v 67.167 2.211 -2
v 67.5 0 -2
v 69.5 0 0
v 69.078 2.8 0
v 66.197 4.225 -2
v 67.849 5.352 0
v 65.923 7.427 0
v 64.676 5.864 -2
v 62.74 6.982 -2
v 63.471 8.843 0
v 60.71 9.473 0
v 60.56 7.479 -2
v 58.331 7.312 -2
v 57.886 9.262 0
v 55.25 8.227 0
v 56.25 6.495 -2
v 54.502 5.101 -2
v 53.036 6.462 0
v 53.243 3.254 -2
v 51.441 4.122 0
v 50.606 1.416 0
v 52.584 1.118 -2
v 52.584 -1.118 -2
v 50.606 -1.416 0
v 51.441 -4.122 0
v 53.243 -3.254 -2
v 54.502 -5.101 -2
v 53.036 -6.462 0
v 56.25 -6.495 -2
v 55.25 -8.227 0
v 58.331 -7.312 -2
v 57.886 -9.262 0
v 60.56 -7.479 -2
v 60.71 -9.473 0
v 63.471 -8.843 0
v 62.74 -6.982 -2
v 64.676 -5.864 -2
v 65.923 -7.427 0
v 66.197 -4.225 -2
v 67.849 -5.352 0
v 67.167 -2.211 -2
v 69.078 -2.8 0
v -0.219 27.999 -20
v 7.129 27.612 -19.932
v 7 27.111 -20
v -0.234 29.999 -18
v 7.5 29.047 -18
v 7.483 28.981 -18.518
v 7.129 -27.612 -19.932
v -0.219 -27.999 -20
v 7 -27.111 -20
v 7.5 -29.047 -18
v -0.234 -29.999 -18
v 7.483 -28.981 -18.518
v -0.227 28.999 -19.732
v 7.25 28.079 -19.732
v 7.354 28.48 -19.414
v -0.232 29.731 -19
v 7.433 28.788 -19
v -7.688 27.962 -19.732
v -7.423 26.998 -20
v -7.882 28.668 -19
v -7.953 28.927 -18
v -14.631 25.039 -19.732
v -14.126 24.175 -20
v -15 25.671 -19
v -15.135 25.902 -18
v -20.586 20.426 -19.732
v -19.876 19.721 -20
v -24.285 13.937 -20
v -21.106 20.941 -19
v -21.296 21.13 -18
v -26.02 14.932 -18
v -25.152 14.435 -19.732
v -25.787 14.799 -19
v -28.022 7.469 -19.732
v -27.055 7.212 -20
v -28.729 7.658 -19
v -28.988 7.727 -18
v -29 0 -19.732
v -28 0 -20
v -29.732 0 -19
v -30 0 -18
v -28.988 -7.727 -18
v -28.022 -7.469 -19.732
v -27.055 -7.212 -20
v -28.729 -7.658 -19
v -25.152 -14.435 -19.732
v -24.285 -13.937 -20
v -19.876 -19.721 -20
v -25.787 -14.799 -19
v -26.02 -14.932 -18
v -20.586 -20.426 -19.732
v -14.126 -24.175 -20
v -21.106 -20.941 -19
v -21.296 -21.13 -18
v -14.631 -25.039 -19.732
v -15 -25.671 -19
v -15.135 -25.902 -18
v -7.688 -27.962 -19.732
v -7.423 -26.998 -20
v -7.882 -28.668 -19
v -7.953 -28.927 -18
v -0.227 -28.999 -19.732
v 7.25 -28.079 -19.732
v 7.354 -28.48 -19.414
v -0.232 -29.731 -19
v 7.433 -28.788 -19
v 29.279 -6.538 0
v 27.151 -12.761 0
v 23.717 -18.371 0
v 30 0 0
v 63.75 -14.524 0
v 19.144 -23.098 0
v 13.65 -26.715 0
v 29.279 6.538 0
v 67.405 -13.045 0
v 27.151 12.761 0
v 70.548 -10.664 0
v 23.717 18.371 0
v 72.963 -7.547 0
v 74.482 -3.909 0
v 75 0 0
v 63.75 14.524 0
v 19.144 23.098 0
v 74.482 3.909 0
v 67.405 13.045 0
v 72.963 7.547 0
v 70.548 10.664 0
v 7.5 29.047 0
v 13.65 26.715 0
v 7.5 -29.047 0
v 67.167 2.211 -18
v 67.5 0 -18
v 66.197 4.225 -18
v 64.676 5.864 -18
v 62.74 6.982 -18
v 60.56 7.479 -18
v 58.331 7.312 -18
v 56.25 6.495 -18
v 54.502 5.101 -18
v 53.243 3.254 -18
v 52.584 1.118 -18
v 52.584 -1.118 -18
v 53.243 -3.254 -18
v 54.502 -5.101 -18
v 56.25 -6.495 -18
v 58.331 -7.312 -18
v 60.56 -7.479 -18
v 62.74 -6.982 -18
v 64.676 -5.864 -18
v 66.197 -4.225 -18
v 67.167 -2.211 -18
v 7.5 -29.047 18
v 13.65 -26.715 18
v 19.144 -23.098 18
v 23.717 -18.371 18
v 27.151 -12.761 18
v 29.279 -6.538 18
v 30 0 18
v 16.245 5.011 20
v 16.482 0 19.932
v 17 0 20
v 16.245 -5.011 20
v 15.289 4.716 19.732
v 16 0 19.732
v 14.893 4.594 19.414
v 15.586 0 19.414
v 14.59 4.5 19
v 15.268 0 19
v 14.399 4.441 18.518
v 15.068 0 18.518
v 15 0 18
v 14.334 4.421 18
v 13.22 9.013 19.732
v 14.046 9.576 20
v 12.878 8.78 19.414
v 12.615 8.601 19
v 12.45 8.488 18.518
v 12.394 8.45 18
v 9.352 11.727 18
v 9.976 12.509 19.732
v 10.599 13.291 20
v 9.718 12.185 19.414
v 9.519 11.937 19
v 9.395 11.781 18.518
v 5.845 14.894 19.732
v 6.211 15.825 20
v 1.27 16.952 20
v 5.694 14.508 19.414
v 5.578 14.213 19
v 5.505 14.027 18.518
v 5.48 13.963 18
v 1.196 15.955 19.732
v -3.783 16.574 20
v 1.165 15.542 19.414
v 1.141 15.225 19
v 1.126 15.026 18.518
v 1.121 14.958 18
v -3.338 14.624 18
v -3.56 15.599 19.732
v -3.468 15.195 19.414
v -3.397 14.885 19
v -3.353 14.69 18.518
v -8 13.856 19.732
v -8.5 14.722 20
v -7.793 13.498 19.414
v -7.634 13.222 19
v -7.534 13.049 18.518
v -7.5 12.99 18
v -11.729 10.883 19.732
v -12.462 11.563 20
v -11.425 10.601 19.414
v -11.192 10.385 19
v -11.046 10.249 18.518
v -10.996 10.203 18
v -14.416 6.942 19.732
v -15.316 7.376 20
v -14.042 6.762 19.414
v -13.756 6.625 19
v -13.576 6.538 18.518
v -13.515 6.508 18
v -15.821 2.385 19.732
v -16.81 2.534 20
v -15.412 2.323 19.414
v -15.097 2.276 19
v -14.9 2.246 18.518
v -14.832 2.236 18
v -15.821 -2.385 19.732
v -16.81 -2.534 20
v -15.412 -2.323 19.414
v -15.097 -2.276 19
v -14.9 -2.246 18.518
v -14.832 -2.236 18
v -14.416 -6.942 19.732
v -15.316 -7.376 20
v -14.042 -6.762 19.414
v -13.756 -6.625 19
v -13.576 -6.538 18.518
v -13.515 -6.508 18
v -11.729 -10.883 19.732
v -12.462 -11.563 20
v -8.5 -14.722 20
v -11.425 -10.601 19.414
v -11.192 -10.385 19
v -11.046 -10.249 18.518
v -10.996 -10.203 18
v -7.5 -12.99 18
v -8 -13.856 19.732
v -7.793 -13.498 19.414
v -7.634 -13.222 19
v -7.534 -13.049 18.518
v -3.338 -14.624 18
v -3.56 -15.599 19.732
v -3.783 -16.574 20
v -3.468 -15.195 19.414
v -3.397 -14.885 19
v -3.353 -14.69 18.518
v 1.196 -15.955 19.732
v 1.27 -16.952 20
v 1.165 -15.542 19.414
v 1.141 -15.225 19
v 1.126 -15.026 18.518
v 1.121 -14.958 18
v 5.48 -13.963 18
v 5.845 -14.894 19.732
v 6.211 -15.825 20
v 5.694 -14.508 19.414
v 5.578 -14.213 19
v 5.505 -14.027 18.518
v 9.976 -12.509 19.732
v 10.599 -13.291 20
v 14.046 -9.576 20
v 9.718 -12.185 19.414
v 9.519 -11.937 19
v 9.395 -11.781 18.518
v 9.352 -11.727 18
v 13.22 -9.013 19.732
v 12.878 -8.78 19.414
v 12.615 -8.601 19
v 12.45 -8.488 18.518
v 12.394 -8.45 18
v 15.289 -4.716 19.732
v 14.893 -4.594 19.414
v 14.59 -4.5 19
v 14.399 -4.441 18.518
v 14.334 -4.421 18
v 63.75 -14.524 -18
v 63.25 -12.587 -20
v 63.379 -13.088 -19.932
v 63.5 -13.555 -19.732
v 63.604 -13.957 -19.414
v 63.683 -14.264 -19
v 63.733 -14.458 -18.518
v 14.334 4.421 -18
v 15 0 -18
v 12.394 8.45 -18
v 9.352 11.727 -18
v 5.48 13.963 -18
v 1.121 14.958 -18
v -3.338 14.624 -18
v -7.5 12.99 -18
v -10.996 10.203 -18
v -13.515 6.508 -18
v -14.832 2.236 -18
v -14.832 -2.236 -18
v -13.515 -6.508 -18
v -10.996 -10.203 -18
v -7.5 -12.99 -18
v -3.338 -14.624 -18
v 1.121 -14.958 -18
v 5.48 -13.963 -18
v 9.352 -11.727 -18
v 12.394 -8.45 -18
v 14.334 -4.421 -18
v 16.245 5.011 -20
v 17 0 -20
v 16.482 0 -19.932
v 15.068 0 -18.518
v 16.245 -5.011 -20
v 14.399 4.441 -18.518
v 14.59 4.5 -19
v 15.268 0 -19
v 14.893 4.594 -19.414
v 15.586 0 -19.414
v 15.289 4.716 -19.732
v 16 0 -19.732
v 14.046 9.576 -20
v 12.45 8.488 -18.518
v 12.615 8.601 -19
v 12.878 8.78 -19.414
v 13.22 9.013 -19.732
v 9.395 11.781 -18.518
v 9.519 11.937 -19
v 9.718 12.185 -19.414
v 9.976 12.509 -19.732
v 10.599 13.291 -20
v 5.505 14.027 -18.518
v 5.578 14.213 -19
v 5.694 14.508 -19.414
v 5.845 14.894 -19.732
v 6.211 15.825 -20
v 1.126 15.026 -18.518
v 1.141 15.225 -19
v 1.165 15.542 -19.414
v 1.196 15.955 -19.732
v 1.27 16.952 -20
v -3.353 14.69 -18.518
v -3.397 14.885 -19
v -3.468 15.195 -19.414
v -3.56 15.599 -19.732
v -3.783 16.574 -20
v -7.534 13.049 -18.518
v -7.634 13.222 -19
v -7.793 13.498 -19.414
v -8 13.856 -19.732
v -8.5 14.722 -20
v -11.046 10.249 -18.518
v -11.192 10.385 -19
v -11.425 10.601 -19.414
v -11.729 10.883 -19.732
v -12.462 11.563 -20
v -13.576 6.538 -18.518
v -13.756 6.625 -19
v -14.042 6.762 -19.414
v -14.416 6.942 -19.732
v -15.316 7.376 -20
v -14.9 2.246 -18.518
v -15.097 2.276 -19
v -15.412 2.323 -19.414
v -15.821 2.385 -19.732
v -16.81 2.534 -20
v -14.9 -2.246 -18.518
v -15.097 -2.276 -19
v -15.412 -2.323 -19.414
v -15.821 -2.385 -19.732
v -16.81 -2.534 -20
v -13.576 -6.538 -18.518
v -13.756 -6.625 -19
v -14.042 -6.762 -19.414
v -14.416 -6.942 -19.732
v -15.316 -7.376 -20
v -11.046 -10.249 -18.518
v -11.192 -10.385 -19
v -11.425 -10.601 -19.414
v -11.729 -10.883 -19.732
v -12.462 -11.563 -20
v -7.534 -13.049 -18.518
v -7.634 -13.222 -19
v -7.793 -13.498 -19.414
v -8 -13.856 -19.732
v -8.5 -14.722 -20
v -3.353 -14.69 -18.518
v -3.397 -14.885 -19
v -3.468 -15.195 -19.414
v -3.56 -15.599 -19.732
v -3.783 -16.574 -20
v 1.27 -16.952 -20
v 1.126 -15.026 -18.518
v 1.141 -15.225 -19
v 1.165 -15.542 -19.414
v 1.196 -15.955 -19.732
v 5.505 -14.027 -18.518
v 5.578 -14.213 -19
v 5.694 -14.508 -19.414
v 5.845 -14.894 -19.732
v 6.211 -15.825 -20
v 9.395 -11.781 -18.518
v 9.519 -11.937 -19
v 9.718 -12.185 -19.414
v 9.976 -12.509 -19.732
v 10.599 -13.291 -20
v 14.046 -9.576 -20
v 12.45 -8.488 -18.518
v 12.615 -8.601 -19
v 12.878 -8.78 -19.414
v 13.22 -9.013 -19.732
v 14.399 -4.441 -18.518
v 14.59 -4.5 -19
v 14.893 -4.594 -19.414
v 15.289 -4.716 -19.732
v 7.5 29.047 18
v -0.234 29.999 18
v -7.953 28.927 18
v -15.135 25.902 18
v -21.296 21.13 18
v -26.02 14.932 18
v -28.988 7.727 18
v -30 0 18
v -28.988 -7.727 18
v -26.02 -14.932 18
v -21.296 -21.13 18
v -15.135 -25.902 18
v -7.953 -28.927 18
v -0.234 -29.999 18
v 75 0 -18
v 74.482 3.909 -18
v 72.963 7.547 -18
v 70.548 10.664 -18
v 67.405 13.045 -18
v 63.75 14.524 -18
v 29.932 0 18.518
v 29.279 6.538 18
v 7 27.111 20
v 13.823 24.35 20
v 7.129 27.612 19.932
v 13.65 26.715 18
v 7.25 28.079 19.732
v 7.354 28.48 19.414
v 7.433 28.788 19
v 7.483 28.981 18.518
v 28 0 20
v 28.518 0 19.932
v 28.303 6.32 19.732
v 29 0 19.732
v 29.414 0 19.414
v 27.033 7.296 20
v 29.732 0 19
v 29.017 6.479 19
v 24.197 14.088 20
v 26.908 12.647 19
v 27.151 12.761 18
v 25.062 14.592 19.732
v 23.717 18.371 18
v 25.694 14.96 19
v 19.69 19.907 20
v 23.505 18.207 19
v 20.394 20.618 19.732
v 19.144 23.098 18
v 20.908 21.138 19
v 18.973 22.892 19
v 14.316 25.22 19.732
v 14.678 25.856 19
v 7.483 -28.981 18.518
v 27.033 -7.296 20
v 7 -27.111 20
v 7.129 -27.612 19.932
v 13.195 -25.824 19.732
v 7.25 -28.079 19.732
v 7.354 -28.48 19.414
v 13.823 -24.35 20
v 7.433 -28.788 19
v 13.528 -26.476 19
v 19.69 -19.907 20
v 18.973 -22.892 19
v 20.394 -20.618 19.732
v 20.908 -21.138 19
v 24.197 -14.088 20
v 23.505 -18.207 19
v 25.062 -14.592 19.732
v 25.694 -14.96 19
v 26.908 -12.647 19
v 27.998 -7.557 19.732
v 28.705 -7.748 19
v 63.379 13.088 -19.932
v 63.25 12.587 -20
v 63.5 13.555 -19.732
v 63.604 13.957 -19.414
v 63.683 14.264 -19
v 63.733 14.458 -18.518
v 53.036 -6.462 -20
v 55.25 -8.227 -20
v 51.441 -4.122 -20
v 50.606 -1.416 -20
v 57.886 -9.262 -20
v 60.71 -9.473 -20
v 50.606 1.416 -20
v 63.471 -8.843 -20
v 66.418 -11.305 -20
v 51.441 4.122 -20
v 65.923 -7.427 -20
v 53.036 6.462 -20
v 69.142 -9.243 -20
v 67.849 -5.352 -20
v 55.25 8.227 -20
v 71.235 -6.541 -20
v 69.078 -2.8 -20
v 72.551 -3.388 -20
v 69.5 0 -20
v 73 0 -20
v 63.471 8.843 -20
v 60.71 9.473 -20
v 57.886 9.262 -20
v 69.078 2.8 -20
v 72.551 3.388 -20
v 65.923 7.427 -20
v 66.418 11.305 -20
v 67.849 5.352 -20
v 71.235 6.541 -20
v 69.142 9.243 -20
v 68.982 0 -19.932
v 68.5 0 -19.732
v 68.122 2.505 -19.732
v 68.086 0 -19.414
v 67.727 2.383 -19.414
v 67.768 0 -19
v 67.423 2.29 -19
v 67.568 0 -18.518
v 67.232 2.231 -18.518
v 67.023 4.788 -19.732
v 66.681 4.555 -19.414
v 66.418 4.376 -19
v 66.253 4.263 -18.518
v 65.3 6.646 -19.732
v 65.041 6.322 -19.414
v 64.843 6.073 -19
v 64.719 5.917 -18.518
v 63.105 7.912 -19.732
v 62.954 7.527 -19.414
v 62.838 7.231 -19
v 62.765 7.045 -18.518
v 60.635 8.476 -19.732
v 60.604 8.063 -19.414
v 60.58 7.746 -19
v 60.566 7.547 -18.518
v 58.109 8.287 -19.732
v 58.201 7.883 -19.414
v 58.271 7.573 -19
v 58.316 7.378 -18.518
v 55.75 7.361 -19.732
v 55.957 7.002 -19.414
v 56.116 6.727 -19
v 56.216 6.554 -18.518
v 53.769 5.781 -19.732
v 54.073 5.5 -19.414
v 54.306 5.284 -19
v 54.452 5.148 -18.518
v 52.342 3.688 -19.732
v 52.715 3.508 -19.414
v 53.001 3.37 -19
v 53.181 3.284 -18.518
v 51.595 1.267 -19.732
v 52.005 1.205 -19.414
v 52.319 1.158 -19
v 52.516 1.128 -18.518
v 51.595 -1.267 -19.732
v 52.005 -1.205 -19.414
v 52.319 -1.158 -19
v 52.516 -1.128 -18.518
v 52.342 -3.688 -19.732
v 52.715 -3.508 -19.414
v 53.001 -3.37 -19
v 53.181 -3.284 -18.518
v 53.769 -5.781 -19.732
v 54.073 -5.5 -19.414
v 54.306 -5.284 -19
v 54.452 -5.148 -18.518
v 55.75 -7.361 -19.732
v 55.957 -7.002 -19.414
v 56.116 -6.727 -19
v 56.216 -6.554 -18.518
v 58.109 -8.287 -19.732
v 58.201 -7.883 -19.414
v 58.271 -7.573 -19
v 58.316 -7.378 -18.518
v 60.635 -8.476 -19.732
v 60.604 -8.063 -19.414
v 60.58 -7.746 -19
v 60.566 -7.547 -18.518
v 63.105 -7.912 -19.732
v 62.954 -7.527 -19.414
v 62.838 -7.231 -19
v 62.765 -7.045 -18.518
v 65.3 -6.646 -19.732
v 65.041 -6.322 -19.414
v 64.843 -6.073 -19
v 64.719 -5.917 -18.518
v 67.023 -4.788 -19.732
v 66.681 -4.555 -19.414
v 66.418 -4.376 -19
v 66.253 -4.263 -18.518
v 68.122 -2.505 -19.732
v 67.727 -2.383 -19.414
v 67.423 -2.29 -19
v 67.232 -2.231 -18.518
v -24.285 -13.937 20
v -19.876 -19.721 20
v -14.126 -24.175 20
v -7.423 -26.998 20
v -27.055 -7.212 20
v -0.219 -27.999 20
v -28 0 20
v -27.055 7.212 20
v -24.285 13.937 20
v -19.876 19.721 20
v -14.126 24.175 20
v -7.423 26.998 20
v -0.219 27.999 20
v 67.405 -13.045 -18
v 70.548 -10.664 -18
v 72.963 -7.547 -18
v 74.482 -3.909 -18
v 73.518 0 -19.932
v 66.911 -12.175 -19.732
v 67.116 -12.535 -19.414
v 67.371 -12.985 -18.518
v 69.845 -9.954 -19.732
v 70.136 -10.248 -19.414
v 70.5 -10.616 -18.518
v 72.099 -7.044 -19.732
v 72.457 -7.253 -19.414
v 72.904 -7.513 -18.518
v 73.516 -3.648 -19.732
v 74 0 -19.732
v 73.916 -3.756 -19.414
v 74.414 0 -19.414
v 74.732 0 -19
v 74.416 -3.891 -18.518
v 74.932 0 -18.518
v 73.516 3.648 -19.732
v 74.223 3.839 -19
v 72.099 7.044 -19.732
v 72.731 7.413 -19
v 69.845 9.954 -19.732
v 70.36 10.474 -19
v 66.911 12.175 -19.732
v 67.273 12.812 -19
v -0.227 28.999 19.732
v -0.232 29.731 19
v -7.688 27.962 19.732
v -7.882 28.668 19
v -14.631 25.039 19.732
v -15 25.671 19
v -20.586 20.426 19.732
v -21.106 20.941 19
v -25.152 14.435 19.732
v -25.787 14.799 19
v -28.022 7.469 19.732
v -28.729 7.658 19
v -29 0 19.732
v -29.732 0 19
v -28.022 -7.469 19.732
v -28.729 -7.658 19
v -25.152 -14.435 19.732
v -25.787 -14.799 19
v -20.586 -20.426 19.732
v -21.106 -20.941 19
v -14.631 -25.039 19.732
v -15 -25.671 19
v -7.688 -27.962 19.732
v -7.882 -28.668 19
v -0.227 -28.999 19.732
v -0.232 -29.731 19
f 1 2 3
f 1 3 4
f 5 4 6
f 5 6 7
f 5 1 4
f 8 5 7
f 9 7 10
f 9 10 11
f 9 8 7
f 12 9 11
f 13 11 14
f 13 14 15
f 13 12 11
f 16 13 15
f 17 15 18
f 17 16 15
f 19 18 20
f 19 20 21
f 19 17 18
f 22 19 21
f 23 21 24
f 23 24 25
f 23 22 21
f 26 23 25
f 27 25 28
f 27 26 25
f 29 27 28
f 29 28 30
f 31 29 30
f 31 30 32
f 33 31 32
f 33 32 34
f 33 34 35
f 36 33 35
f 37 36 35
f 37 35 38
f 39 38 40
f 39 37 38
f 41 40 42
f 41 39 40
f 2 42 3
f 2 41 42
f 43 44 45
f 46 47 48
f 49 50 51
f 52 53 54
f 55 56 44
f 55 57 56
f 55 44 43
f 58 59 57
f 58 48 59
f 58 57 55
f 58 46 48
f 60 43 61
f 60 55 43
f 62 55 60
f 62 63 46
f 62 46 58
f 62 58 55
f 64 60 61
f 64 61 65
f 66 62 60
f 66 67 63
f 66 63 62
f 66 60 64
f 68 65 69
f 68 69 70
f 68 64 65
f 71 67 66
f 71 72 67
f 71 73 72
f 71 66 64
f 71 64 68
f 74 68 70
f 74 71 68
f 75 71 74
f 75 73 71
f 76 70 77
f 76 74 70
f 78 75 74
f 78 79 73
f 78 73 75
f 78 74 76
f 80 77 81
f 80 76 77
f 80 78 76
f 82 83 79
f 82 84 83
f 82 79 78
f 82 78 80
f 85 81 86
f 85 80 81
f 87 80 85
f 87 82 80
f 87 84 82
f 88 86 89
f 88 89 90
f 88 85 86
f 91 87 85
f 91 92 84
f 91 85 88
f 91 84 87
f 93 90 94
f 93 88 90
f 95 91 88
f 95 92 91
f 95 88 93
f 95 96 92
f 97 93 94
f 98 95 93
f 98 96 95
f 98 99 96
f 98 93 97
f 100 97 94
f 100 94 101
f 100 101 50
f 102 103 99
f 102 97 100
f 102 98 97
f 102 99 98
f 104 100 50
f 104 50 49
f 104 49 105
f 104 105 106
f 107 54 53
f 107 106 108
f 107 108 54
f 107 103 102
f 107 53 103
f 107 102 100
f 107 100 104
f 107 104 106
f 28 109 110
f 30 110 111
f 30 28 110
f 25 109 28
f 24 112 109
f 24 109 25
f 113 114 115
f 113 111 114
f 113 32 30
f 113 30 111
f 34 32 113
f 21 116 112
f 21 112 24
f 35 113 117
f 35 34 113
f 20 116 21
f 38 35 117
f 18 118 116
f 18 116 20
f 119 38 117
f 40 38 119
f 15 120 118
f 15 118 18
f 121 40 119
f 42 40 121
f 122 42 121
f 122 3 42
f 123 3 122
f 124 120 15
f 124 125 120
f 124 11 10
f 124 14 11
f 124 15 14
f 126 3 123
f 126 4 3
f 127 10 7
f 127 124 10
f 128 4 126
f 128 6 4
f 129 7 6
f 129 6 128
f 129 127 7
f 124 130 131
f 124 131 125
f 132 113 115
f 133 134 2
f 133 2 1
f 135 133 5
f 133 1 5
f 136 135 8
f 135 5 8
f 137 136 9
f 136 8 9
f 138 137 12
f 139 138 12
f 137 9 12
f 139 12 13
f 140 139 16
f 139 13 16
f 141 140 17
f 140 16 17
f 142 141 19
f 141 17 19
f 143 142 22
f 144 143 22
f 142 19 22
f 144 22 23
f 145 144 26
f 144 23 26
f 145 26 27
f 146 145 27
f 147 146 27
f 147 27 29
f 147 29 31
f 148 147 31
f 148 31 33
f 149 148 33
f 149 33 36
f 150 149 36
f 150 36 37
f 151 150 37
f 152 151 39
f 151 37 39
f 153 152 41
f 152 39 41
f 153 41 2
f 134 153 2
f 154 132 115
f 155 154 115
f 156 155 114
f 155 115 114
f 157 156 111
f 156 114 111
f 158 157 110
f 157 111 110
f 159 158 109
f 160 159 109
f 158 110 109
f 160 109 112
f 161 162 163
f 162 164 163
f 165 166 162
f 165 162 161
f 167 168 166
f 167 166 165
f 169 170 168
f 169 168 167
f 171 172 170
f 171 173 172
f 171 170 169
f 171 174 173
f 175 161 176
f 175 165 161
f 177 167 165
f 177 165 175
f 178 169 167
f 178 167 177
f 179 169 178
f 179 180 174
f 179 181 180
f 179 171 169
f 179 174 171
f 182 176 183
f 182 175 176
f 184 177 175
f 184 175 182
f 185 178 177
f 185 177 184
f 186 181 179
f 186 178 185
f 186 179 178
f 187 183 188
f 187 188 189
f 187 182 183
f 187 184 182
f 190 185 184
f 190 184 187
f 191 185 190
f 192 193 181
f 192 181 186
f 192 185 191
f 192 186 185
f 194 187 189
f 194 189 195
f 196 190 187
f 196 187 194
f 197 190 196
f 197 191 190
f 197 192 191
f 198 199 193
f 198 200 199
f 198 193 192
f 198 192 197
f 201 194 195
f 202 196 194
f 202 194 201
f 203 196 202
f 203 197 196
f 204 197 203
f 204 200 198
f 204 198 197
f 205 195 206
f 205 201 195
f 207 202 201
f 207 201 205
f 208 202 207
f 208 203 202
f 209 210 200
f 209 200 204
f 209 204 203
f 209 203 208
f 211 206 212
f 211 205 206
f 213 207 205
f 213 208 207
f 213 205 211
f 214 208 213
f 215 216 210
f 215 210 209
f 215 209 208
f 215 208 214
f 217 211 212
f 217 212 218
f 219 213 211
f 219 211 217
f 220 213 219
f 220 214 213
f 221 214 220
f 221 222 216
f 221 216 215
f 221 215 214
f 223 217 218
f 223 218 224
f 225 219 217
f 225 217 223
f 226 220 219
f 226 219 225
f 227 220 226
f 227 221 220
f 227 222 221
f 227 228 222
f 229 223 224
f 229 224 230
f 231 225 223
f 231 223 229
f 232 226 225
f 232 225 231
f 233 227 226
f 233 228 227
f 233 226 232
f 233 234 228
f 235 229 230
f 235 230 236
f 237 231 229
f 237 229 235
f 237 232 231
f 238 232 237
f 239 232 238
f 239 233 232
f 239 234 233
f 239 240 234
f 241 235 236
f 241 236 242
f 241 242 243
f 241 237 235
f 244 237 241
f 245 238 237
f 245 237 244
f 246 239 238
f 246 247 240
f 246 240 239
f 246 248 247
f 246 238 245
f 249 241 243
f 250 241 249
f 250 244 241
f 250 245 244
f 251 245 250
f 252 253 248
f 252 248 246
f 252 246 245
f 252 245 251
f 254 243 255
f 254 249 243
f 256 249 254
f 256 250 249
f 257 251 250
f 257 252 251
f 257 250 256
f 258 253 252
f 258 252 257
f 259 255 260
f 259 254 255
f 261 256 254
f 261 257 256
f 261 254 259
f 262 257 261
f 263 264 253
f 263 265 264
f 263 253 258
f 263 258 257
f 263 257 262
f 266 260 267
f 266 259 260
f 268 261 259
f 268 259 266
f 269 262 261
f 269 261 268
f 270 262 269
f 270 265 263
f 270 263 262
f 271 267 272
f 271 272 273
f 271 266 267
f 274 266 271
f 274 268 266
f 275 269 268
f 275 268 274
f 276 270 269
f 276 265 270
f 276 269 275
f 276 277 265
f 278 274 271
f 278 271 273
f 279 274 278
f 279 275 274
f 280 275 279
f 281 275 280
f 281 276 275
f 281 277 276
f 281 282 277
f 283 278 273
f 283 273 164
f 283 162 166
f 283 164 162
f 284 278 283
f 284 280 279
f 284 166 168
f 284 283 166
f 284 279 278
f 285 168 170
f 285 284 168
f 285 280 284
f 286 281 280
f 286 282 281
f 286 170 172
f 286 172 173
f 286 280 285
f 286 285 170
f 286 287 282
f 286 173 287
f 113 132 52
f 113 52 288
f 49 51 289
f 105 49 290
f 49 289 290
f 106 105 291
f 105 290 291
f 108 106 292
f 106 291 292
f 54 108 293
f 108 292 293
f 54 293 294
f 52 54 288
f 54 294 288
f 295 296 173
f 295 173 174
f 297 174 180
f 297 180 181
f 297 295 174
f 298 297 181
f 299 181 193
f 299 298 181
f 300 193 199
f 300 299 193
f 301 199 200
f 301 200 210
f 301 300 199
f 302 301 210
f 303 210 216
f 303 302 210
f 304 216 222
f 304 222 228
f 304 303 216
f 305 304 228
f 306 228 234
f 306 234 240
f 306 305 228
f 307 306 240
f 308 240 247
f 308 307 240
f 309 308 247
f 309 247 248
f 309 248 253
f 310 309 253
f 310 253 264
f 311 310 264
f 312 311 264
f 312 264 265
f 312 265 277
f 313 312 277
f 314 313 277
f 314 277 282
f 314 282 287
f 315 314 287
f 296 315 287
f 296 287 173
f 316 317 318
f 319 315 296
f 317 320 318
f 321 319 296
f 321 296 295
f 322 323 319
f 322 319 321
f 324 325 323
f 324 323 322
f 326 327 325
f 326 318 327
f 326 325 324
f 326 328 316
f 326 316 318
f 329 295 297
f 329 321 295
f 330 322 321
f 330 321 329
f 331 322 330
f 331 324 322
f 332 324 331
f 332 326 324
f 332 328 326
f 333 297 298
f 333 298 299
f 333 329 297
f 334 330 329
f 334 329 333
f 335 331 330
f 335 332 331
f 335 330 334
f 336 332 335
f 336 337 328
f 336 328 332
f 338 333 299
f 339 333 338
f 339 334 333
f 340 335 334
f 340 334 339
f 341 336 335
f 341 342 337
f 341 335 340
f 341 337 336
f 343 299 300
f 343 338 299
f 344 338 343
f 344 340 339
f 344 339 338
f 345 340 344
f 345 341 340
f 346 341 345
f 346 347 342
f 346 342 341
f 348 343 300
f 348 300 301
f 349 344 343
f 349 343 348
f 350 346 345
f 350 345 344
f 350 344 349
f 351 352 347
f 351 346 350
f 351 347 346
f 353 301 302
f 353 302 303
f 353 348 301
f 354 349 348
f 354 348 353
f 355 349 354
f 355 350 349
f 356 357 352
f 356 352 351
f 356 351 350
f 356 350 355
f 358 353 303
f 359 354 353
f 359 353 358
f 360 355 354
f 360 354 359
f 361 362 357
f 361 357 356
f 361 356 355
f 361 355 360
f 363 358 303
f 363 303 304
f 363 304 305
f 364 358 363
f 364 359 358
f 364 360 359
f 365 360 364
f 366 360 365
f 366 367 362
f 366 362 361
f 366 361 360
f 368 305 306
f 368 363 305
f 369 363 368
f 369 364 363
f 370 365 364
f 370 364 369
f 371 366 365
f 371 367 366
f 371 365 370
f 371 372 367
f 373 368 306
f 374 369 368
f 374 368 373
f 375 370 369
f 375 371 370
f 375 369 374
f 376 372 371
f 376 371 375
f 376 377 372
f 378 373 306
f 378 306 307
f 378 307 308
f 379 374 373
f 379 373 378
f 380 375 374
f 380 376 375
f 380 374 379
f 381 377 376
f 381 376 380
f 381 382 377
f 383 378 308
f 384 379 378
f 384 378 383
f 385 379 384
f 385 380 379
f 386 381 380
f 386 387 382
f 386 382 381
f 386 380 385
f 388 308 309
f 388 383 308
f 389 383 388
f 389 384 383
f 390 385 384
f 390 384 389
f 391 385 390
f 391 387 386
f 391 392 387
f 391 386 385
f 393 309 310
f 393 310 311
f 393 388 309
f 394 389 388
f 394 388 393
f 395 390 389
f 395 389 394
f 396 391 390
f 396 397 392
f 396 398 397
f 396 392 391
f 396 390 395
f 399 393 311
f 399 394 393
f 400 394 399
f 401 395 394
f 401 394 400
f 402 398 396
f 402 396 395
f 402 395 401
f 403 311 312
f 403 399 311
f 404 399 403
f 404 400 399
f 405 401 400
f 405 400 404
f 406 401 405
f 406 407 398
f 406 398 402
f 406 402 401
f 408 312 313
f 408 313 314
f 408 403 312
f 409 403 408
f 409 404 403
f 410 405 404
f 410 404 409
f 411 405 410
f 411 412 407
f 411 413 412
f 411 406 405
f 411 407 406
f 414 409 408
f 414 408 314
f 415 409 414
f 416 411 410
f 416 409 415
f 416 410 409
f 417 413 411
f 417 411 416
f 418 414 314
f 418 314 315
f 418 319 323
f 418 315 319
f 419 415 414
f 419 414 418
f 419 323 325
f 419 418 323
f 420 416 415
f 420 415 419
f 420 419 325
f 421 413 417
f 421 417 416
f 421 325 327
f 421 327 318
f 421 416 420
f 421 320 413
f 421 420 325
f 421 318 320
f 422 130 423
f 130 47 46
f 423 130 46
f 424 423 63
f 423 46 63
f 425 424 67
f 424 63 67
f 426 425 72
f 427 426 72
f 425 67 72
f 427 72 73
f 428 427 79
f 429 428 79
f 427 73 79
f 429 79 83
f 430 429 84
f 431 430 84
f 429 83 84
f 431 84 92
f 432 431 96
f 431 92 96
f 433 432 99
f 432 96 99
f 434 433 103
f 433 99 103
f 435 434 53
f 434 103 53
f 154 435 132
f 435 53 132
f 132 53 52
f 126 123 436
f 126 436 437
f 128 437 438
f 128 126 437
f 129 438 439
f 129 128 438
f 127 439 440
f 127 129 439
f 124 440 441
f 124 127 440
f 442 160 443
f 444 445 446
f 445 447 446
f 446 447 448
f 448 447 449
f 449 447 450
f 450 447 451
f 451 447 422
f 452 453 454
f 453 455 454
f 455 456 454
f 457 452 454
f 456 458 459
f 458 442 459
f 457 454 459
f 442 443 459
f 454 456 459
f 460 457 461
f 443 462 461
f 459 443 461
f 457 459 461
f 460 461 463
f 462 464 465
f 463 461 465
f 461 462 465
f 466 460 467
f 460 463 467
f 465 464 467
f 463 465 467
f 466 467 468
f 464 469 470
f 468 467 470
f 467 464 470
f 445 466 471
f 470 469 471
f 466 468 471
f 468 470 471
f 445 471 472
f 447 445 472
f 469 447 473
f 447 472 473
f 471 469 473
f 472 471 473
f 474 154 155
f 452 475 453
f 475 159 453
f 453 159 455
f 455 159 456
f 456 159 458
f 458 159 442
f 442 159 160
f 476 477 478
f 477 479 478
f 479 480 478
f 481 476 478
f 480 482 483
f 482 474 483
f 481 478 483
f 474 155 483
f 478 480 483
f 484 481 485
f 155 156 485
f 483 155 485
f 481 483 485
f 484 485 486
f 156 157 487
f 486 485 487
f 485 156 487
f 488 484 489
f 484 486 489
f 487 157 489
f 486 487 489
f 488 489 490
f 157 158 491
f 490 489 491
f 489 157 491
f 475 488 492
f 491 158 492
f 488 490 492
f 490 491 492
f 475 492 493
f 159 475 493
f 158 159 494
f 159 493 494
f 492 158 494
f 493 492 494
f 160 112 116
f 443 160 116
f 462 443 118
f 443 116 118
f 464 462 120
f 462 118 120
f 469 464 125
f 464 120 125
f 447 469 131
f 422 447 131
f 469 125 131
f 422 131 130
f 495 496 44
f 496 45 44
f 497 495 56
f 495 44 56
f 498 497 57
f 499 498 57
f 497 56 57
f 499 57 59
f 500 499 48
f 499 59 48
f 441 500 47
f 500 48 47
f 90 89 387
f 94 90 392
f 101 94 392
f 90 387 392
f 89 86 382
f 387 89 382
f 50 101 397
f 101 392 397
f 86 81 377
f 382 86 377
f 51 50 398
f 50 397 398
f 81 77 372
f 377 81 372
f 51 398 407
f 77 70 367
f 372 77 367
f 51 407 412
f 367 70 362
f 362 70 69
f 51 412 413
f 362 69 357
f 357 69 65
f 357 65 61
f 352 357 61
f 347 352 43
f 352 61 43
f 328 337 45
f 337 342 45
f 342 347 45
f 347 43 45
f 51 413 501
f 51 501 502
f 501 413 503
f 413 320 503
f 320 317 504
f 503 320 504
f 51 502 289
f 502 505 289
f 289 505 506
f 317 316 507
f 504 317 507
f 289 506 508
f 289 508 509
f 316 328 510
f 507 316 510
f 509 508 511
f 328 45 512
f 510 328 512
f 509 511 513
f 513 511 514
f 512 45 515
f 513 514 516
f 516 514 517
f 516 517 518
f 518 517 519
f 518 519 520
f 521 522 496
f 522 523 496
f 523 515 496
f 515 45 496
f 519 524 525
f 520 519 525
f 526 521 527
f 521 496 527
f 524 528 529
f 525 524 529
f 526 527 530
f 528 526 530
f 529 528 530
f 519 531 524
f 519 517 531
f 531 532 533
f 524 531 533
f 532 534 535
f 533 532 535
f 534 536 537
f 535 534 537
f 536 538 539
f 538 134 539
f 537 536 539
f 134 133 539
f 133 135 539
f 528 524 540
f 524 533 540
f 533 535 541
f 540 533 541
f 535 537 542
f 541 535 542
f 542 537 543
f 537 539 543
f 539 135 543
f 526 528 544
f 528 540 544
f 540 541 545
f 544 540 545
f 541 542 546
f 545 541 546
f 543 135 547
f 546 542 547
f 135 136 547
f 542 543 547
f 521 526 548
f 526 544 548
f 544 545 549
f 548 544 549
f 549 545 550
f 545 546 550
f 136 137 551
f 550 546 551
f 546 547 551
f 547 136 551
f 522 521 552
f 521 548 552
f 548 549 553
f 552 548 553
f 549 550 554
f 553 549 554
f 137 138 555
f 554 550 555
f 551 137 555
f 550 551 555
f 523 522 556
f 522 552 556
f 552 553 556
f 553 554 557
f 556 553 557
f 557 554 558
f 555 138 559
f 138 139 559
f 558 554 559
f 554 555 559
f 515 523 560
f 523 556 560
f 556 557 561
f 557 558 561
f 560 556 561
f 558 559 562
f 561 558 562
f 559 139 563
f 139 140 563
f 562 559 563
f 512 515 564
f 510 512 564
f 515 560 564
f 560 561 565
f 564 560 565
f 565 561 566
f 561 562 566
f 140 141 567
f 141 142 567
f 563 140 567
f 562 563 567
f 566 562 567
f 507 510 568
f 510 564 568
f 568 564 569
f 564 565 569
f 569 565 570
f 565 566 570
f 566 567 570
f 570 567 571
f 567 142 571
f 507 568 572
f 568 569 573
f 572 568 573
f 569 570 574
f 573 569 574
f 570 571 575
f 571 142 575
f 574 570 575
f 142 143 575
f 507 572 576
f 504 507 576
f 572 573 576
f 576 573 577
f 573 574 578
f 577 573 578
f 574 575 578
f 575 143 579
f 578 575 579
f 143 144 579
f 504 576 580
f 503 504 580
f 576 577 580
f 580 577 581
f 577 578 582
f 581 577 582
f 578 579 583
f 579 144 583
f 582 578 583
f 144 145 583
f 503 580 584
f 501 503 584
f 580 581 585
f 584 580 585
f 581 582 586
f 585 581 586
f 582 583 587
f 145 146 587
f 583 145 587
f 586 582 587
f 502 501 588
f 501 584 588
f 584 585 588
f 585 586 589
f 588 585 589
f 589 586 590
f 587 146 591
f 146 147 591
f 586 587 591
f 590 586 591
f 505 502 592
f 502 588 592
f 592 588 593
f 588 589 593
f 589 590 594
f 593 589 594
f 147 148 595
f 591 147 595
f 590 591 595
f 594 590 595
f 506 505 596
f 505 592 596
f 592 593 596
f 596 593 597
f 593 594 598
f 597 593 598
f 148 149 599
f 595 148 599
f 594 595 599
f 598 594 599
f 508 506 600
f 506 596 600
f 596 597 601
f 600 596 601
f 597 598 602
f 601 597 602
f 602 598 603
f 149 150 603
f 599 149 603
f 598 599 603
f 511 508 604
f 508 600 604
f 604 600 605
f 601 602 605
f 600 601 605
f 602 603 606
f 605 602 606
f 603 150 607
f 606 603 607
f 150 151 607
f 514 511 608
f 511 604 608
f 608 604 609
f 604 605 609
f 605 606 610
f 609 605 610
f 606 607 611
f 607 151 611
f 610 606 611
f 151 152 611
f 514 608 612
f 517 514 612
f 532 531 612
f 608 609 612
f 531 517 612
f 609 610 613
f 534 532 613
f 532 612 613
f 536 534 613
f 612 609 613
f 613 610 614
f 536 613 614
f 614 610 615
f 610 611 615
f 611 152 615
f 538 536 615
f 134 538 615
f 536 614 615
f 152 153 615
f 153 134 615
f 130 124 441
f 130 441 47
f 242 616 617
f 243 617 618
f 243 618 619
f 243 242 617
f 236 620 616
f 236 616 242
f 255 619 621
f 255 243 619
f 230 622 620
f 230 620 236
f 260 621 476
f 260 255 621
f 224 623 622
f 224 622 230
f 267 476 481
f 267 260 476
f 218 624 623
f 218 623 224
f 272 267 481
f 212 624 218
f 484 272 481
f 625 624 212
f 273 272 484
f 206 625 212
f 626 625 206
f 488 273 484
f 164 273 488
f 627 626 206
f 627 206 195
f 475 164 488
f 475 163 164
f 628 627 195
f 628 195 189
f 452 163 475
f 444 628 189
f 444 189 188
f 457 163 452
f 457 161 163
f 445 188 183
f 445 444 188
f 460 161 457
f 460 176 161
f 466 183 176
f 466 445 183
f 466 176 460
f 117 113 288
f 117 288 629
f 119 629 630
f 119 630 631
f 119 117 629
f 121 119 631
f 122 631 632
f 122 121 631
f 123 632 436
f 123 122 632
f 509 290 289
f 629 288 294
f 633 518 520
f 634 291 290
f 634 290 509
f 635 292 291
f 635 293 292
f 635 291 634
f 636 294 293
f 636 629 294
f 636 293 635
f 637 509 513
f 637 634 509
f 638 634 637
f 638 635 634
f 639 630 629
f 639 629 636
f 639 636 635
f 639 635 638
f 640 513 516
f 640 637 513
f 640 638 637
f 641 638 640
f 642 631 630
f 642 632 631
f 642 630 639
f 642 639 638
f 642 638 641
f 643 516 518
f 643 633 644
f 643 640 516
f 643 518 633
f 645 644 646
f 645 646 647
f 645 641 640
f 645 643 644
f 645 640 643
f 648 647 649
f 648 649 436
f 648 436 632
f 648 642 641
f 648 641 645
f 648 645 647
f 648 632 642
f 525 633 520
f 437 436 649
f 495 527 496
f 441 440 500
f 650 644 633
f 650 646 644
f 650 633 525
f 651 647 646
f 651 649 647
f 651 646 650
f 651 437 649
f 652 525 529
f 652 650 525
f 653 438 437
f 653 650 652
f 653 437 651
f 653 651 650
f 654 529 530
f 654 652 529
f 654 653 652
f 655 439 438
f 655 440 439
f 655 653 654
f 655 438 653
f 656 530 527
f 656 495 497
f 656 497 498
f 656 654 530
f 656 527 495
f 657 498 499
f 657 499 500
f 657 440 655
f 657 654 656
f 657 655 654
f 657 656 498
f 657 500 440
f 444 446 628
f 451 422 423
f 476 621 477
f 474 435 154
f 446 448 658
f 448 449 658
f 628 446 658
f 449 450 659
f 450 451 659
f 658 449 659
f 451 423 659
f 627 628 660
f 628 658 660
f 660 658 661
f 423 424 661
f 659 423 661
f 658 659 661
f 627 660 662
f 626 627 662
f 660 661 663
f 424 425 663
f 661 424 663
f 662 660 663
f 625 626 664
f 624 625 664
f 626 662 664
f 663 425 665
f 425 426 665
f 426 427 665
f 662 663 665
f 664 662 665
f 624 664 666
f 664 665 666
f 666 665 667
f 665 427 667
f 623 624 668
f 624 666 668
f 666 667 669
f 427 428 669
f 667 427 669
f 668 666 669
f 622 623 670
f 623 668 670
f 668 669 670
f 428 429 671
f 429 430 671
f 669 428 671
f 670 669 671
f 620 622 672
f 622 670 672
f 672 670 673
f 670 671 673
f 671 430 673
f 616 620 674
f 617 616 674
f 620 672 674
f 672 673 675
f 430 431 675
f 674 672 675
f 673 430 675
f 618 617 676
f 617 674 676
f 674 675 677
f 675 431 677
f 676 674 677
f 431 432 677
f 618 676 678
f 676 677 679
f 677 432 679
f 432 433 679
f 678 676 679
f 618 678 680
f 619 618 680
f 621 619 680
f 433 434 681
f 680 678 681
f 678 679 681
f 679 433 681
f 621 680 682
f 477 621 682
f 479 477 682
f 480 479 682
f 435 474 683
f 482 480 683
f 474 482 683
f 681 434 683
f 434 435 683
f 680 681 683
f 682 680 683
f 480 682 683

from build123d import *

# Parameters (mm, degrees)
F0_R     = 15
F0_R_2   = 7.5
F1_DEPTH = 20
F2_DEPTH = 20
F3_R     = 2
F4_SIZE  = 2


with BuildPart() as f1:
    # F0 (on Top) → F1 (new body)
    with BuildSketch(Plane.XY):
        with BuildLine():
            ThreePointArc((7.5, -29.047375), (23.717082, -18.371173), (30, 0))
            ThreePointArc((30, 0), (23.717082, 18.371173), (7.5, 29.047375))
            ThreePointArc((7.5, 29.047375), (-30, 0), (7.5, -29.047375))
        make_face()
        Circle(F0_R, mode=Mode.SUBTRACT)
        with BuildLine():
            ThreePointArc((7.5, 29.047375), (23.717082, 18.371173), (30, 0))
            ThreePointArc((30, 0), (23.717082, -18.371173), (7.5, -29.047375))
            Line((7.5, -29.047375), (63.75, -14.523688))
            ThreePointArc((63.75, -14.523688), (45, 0), (63.75, 14.523688))
            Line((63.75, 14.523688), (7.5, 29.047375))
        make_face()
        with BuildLine():
            ThreePointArc((75, 0), (71.858541, 9.185587), (63.75, 14.523688))
            ThreePointArc((63.75, 14.523688), (45, 0), (63.75, -14.523688))
            ThreePointArc((63.75, -14.523688), (71.858541, -9.185587), (75, 0))
        make_face()
        with Locations((60, 0)):
            Circle(F0_R_2, mode=Mode.SUBTRACT)
    extrude(amount=-F1_DEPTH)

    # F0 (on Top) → F2 (join)
    with BuildSketch(Plane.XY):
        with BuildLine():
            ThreePointArc((7.5, -29.047375), (23.717082, -18.371173), (30, 0))
            ThreePointArc((30, 0), (23.717082, 18.371173), (7.5, 29.047375))
            ThreePointArc((7.5, 29.047375), (-30, 0), (7.5, -29.047375))
        make_face()
        Circle(F0_R, mode=Mode.SUBTRACT)
    extrude(amount=F2_DEPTH)

    # F3
    f3_edges = [f1.edges().sort_by_distance(p)[0] for p in [
        (-7.5, 29.047375, 20),
        (-15, 0, 20),
        (-30, 0, -20),
        (35.625, -21.785531, -20),
        (75, 0, -20),
        (35.625, 21.785531, -20),
        (-15, 0, -20),
        (52.5, 0, -20),
    ]]
    fillet(f3_edges, radius=F3_R)

    # F4
    f4_edges = [f1.edges().sort_by_distance(p)[0] for p in [
        (52.5, 0, 0),
    ]]
    chamfer(f4_edges, length=F4_SIZE)


solid = f1.part
